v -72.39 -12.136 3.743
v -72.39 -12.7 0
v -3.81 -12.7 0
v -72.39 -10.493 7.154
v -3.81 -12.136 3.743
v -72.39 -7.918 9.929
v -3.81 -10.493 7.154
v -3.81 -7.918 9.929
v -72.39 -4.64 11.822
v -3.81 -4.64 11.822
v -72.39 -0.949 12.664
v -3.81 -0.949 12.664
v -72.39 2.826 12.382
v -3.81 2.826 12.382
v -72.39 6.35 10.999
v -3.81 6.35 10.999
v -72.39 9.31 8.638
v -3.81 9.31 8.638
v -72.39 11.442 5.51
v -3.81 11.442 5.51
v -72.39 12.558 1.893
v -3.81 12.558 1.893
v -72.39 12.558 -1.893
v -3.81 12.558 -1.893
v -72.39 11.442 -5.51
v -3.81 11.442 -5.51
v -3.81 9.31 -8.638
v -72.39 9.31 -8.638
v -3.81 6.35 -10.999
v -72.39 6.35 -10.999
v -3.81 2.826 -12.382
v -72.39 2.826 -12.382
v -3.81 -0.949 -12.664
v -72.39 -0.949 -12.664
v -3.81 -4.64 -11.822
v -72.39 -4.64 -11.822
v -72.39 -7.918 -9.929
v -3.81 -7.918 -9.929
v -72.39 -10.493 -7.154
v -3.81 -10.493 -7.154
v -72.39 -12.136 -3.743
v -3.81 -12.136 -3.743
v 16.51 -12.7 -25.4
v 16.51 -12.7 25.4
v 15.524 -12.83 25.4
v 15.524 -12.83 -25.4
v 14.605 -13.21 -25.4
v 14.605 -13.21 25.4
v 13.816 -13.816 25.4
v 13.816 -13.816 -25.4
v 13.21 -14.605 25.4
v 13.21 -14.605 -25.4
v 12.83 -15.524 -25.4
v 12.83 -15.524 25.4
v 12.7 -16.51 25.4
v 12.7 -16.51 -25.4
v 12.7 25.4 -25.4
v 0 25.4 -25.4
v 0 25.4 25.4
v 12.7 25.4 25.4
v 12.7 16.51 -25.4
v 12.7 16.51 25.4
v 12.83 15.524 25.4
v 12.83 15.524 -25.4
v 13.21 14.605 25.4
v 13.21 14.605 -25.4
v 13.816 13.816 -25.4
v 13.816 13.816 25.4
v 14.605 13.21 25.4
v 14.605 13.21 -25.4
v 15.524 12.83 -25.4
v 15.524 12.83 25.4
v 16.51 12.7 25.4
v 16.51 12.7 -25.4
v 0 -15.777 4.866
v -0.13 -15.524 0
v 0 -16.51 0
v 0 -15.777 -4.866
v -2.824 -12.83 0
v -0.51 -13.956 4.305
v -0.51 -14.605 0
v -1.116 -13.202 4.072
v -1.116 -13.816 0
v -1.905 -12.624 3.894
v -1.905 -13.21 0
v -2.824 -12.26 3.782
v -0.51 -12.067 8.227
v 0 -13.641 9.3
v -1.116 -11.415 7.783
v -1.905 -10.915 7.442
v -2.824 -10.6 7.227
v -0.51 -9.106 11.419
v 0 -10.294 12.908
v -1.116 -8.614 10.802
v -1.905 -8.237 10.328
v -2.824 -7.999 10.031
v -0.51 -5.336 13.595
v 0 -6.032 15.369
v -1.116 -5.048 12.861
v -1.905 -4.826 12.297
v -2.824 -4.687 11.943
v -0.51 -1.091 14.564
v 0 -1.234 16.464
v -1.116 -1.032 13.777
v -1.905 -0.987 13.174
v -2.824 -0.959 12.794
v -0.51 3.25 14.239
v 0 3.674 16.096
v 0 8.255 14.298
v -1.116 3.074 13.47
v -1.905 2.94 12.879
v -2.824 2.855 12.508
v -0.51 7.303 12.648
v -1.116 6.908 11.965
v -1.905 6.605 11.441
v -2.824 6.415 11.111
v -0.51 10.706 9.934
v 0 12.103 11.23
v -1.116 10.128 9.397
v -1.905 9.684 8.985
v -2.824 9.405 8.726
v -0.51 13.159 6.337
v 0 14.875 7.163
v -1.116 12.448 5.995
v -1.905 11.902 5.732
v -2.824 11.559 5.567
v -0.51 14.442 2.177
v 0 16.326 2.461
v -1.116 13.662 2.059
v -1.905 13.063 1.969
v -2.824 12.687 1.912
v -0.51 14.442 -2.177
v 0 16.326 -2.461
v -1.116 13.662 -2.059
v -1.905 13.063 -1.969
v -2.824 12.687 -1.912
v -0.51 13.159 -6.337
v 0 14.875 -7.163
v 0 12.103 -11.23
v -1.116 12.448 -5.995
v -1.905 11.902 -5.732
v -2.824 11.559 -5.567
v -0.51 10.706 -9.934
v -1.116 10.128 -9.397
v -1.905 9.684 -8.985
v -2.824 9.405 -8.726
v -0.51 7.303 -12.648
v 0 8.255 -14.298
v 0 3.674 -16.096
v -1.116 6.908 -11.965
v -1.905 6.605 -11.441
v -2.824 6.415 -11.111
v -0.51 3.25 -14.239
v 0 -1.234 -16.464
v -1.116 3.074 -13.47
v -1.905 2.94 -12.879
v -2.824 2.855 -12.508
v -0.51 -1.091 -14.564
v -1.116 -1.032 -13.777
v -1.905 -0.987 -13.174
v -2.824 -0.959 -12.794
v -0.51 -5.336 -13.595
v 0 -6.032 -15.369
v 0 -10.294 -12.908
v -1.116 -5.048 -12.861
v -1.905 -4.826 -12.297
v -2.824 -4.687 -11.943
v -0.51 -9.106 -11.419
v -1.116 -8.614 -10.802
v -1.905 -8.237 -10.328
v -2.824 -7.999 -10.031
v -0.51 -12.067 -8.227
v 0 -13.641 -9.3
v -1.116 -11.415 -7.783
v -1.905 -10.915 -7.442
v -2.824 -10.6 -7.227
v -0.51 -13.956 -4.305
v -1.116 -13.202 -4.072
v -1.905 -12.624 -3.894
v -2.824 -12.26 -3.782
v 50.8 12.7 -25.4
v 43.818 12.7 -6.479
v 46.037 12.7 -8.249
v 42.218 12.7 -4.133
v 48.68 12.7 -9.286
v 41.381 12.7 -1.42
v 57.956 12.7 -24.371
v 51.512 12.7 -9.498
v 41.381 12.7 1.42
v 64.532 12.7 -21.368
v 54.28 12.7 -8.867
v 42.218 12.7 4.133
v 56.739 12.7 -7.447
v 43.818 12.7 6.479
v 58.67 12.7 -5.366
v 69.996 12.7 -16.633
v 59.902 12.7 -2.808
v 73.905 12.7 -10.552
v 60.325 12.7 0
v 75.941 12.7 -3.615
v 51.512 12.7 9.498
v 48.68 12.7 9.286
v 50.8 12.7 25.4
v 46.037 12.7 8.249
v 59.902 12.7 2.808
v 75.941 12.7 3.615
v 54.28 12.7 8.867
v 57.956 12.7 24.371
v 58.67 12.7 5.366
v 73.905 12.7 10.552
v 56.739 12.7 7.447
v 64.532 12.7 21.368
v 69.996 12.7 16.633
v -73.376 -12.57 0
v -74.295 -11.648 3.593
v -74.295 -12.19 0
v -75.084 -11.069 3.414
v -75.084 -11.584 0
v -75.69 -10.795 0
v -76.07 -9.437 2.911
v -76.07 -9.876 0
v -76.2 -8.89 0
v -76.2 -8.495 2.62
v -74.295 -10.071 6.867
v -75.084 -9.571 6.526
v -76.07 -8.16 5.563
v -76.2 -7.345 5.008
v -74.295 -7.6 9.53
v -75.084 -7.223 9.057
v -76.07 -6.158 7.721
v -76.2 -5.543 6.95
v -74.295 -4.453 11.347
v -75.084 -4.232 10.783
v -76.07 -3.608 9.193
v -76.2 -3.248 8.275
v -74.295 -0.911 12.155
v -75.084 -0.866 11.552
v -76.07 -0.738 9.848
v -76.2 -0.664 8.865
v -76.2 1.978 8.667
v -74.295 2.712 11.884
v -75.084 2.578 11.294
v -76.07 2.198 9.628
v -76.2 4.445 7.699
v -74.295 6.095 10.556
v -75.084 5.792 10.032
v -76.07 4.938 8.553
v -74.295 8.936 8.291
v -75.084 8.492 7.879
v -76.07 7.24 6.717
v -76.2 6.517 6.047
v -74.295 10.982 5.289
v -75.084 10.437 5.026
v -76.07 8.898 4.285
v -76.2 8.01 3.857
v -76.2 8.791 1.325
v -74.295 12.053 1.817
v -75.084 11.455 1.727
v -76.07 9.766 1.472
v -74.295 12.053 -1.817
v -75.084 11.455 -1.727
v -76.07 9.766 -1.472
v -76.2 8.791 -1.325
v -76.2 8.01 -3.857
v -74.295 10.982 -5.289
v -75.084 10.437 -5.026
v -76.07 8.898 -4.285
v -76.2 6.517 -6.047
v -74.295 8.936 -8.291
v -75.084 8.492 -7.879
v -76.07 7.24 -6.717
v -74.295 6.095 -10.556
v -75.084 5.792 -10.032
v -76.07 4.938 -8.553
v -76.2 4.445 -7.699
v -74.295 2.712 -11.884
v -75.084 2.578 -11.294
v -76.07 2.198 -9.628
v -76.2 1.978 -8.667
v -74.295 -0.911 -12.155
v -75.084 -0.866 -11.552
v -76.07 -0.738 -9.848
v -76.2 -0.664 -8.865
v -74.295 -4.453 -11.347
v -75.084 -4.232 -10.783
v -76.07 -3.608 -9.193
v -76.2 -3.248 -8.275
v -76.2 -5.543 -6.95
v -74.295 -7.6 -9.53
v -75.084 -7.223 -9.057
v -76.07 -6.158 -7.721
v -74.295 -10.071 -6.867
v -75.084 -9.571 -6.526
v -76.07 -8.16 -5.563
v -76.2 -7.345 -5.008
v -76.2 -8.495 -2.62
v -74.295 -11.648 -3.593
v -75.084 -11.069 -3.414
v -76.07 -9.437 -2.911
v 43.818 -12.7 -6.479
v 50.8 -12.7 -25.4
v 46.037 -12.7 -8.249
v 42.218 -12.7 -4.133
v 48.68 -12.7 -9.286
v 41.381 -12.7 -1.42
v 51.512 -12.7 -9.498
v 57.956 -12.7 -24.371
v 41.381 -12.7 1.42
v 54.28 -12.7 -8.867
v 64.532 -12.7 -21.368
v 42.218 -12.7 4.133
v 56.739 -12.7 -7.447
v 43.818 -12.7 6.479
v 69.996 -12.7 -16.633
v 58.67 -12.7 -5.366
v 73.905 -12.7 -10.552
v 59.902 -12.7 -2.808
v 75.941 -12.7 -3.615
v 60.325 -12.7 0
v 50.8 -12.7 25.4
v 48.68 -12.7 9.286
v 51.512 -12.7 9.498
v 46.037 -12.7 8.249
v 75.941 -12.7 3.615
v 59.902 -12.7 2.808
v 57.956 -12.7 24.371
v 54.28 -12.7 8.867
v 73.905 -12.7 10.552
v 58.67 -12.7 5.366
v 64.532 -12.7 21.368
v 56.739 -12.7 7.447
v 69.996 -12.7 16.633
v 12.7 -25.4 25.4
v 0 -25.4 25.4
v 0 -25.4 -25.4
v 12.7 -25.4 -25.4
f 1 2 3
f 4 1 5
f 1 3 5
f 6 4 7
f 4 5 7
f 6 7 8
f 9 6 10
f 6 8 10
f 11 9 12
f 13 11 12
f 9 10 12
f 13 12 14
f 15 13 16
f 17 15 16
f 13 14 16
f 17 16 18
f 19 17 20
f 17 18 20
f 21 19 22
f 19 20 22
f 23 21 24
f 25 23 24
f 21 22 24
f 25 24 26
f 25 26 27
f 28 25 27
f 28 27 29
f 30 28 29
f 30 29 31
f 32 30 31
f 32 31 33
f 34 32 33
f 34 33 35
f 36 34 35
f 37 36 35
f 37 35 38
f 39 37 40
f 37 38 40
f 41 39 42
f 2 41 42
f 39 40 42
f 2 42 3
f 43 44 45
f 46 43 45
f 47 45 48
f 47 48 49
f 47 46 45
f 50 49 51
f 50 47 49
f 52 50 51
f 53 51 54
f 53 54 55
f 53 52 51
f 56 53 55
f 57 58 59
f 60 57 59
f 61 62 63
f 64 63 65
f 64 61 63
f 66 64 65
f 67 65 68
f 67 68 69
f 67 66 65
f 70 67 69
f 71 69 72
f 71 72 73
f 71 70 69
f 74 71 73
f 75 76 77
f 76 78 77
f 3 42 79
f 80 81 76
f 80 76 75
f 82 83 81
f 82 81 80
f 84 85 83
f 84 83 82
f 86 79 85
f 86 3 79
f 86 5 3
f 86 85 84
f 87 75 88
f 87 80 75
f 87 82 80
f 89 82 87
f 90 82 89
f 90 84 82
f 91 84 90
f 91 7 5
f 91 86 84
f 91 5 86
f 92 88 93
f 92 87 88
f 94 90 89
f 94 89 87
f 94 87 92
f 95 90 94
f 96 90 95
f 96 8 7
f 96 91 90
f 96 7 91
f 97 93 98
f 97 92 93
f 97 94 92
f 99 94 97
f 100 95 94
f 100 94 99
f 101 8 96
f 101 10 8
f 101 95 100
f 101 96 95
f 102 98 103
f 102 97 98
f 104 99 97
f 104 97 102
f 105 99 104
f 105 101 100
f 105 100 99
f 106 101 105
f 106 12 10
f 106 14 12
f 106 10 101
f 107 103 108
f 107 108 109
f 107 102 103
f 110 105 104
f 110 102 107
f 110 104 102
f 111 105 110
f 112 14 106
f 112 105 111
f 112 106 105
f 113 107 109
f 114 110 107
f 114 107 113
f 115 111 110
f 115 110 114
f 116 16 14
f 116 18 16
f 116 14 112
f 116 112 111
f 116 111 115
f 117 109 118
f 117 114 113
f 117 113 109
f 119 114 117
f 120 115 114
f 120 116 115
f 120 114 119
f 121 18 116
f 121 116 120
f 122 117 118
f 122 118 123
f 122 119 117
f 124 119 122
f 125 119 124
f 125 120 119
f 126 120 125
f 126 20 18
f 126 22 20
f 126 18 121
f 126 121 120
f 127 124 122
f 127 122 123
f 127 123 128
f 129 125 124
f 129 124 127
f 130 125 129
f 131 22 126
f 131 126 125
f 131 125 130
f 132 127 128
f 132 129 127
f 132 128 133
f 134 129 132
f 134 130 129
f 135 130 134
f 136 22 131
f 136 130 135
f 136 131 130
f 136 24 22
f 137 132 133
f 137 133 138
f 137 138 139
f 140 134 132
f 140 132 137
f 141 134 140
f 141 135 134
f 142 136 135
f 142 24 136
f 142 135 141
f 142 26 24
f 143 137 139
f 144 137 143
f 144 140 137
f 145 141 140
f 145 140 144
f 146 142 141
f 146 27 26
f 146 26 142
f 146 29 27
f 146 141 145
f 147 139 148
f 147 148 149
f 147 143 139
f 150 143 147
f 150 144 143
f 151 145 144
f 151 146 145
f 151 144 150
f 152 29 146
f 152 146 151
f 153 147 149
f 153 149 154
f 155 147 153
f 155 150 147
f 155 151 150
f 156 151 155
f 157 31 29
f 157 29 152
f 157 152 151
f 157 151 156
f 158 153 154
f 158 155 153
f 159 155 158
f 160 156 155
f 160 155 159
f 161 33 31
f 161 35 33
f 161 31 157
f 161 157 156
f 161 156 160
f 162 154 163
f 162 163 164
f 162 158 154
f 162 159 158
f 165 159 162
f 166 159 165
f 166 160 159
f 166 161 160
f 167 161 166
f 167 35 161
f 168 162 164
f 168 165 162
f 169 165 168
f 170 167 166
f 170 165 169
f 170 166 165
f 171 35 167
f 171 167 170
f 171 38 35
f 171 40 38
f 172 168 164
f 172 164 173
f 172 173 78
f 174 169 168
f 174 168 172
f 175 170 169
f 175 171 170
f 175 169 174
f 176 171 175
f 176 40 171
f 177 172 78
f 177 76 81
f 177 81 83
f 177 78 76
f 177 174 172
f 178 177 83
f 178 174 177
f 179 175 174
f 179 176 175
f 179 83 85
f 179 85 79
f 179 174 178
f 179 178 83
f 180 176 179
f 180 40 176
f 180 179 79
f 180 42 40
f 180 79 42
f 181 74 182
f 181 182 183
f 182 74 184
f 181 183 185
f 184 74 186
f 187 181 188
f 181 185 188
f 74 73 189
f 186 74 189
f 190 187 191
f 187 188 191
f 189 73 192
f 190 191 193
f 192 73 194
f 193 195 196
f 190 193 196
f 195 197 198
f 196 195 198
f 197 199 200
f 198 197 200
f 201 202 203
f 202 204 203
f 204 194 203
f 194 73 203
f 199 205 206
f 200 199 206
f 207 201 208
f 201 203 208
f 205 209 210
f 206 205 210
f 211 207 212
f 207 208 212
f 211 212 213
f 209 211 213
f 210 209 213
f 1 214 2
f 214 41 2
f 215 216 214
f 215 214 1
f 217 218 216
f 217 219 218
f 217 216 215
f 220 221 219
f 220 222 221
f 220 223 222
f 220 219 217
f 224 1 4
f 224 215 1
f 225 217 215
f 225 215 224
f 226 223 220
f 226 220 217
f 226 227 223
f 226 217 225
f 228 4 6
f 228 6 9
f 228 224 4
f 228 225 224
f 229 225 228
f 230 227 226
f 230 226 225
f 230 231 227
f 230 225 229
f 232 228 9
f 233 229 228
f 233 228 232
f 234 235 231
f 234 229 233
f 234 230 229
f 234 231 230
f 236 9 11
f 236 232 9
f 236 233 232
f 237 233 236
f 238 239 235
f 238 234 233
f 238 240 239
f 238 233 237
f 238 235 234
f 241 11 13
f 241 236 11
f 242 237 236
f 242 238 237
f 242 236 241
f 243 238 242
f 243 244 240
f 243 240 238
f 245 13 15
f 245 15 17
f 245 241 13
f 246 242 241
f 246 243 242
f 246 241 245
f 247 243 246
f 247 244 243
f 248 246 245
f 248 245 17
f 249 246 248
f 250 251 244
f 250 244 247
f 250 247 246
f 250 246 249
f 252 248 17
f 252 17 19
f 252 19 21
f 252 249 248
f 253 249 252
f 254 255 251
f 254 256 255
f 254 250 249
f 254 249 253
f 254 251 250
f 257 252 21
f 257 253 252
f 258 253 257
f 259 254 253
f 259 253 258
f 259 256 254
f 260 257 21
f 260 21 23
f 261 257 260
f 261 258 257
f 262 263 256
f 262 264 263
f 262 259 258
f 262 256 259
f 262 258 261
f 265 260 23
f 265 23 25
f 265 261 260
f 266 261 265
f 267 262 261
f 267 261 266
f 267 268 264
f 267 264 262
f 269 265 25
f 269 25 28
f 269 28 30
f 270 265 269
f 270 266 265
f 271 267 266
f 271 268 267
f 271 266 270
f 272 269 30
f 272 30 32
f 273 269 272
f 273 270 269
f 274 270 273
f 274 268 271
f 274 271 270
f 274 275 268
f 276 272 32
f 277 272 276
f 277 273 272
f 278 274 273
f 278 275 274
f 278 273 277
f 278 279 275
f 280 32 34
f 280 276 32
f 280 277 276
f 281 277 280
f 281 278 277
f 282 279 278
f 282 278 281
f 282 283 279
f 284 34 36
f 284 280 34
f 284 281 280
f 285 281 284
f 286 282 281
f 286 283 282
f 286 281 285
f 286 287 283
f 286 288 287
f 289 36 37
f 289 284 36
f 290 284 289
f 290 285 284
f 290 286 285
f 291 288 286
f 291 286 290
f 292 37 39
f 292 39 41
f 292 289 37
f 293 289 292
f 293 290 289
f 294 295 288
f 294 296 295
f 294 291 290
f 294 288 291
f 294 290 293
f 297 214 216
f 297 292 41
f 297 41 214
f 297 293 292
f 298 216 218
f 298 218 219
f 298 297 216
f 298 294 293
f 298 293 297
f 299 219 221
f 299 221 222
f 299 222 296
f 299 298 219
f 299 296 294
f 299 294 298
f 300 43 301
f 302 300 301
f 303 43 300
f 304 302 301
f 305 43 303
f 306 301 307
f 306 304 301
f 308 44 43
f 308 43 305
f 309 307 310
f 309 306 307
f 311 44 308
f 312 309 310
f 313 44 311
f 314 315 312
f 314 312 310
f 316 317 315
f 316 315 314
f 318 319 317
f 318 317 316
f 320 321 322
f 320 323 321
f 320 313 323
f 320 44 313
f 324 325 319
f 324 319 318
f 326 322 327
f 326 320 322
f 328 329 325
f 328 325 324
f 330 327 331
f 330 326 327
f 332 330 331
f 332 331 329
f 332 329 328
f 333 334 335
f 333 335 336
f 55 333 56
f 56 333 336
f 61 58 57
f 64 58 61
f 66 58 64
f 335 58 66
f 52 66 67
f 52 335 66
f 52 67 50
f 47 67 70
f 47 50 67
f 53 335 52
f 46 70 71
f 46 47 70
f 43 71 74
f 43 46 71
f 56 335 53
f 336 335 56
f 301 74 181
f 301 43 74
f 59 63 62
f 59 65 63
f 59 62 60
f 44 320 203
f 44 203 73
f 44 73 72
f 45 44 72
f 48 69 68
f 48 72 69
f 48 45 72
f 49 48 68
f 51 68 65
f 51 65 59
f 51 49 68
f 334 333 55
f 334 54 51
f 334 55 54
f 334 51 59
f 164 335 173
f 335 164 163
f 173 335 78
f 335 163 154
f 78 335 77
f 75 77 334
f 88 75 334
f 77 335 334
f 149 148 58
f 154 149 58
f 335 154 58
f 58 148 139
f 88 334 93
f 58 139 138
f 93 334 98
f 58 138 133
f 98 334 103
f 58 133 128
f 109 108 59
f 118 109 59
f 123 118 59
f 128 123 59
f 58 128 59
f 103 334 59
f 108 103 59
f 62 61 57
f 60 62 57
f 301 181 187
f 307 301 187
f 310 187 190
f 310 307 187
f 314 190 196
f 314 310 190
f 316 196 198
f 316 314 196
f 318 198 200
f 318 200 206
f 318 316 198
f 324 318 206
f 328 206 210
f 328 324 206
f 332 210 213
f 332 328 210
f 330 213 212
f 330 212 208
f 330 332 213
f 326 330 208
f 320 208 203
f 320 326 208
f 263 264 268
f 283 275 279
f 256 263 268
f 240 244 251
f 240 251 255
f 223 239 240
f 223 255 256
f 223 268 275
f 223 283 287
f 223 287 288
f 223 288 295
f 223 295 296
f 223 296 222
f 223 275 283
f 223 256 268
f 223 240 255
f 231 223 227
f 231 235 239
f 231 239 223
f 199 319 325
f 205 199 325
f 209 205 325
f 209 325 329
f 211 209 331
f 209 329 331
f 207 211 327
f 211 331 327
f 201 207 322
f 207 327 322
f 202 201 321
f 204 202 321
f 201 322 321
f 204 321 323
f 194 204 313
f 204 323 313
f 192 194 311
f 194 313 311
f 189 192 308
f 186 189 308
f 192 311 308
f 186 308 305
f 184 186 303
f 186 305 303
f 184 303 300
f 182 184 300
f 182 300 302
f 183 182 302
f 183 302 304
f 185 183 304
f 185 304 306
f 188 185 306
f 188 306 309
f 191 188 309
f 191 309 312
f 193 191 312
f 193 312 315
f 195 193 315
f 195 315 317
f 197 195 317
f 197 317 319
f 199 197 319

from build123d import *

# Parameters (mm, degrees)
F0_W     = 50.8
F0_H     = 50.8
F1_DEPTH = 12.7
F2_R     = 12.7
F3_DEPTH = 76.2
F4_R     = 9.525
F5_DEPTH = 38.1
F6_DEPTH = 12.7
F7_R     = 3.81


with BuildPart() as f1:
    # F0 (on Right) → F1 (new body)
    with BuildSketch(Plane.YZ):
        Rectangle(F0_W, F0_H)
    extrude(amount=F1_DEPTH)

    # F2 (on face) → F3 (join)
    with BuildSketch(Plane(origin=(0, 0, 0), x_dir=(0, -1, 0), z_dir=(-1, 0, 0))):
        Circle(F2_R)
    extrude(amount=F3_DEPTH)

    # F4 (on face) → F5 (join)
    with BuildSketch(Plane.XZ.offset(25.4)):
        with BuildLine():
            Line((50.8, 25.4), (12.7, 25.4))
            Line((12.7, 25.4), (12.7, -25.4))
            Line((12.7, -25.4), (50.8, -25.4))
            ThreePointArc((50.8, -25.4), (76.2, 0), (50.8, 25.4))
        make_face()
        with Locations((50.8, 0)):
            Circle(F4_R, mode=Mode.SUBTRACT)
    extrude(amount=-F5_DEPTH)

    # F4 (on face) → F6 (cut)
    with BuildSketch(Plane.XZ.offset(25.4)):
        with BuildLine():
            Line((50.8, 25.4), (12.7, 25.4))
            Line((12.7, 25.4), (12.7, -25.4))
            Line((12.7, -25.4), (50.8, -25.4))
            ThreePointArc((50.8, -25.4), (76.2, 0), (50.8, 25.4))
        make_face()
        with Locations((50.8, 0)):
            Circle(F4_R, mode=Mode.SUBTRACT)
    extrude(amount=-F6_DEPTH, mode=Mode.SUBTRACT)

    # F7
    f7_edges = [f1.edges().sort_by_distance(p)[0] for p in [
        (-76.2, 12.7, 0),
        (0, 12.7, 0),
        (12.7, -12.7, 0),
        (12.7, 12.7, 0),
    ]]
    fillet(f7_edges, radius=F7_R)


solid = f1.part
